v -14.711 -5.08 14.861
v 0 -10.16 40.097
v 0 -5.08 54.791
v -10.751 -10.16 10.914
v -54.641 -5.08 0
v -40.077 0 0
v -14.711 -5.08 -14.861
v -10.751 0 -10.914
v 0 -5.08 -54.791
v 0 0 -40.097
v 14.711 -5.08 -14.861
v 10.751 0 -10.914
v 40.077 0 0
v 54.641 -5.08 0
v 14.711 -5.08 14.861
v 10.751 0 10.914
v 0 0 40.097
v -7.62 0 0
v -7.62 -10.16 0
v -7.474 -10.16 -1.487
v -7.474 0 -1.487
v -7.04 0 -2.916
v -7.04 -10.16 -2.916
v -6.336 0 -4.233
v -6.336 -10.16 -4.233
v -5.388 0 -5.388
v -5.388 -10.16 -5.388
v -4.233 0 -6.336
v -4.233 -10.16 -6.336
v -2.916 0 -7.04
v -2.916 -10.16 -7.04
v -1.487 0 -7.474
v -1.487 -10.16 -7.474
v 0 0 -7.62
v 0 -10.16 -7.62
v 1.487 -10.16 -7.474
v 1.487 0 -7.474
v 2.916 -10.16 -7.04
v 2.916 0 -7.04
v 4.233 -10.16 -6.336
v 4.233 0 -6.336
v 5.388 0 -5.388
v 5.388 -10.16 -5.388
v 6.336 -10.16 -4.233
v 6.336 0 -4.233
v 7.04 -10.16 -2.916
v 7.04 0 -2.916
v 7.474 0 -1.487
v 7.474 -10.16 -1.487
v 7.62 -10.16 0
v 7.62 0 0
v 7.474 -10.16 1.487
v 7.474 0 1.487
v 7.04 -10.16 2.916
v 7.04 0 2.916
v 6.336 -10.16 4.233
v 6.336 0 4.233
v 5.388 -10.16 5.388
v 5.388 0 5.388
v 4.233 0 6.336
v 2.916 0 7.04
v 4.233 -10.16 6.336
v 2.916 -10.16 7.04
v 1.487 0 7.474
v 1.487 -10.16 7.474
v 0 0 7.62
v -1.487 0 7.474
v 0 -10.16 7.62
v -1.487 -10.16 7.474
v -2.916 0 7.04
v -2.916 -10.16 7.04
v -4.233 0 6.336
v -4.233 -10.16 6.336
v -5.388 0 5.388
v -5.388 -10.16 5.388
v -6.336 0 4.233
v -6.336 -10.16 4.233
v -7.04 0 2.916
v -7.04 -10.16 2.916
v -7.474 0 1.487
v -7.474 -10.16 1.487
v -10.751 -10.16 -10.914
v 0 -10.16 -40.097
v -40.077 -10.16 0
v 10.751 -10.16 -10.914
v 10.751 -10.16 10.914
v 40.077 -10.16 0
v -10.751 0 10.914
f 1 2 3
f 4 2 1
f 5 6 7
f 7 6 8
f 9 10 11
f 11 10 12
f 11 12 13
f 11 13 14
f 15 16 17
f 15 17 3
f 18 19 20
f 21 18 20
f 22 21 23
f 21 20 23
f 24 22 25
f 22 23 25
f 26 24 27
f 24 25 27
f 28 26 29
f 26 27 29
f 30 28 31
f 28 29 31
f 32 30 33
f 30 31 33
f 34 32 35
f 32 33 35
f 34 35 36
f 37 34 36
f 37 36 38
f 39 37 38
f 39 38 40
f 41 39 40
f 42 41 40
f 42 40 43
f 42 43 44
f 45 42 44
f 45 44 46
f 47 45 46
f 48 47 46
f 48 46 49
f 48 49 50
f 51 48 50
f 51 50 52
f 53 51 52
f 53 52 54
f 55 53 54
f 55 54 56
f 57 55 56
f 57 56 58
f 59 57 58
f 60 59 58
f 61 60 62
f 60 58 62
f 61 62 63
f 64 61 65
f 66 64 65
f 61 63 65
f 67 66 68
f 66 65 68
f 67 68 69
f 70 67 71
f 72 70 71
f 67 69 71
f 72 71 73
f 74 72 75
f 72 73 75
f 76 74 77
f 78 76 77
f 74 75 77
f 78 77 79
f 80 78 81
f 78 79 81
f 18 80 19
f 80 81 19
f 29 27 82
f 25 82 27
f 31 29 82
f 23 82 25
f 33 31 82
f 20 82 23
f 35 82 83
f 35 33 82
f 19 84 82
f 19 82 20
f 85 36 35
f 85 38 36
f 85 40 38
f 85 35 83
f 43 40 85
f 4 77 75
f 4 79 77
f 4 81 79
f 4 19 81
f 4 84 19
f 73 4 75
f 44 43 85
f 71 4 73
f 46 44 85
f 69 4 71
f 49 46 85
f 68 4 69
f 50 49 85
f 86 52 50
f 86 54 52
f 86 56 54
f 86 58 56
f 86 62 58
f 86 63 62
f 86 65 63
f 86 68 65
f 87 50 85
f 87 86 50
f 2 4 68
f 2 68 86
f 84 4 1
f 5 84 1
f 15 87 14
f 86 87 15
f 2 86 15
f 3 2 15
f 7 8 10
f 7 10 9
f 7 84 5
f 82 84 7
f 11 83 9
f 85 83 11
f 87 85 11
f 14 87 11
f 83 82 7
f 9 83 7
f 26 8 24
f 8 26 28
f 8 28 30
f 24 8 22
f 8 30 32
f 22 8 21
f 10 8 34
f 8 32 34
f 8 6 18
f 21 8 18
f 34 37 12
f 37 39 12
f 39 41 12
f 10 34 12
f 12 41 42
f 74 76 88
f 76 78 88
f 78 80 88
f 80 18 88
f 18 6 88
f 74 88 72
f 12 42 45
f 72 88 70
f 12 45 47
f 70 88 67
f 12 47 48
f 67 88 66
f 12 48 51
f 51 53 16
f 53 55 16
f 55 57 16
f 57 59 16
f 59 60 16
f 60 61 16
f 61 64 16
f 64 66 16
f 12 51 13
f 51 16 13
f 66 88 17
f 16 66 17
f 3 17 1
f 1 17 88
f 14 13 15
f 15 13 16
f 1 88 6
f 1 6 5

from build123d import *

# Parameters (mm, degrees)
F1_DEPTH = 10.16
F2_SIZE  = 5.07999
F4_D     = 15.24


# Not quite as in the source:
# - a fillet or chamfer is up to 0.001 mm smaller than in the source, because OpenCascade refuses the exact size


with BuildPart() as f1:
    # F0 (on Front) → F1 (new body)
    with BuildSketch(Plane.XZ):
        Polygon((14.7110316902, 14.8611441255), (0, 54.7910891473), (-14.7110316902, 14.8611441255), (0, 0), align=None)
        Polygon((54.6409785748, 0), (14.7110316902, 14.8611441255), (0, 0), (14.7110316902, -14.8611441255), align=None)
        Polygon((14.7110316902, -14.8611441255), (0, 0), (-14.7110316902, -14.8611441255), (0, -54.7910891473), align=None)
        Polygon((0, 0), (-14.7110316902, 14.8611441255), (-54.6409785748, 0), (-14.7110316902, -14.8611441255), align=None)
    extrude(amount=F1_DEPTH)

    # F2 (size 5.08 in the source; OpenCascade refuses exactly that, so slightly less here)
    f2_edges = [f1.edges().sort_by_distance(p)[0] for p in [
        (7.355516, 0, 34.826117),
        (-7.355516, 0, 34.826117),
        (-7.355516, -10.16, 34.826117),
        (7.355516, -10.16, 34.826117),
        (-34.676005, -10.16, 7.430572),
        (-34.676005, 0, 7.430572),
        (-34.676005, -10.16, -7.430572),
        (-34.676005, 0, -7.430572),
        (34.676005, 0, -7.430572),
        (34.676005, 0, 7.430572),
        (34.676005, -10.16, 7.430572),
        (34.676005, -10.16, -7.430572),
        (-7.355516, 0, -34.826117),
        (7.355516, 0, -34.826117),
        (-7.355516, -10.16, -34.826117),
        (7.355516, -10.16, -34.826117),
    ]]
    chamfer(f2_edges, length=F2_SIZE)

    # F4 (through all)
    with Locations(Plane(origin=(0, 0, 0), x_dir=(1, 0, 0), z_dir=(0, 1, 0))):
        with Locations((0, 0)):
            Hole(F4_D / 2)


solid = f1.part
